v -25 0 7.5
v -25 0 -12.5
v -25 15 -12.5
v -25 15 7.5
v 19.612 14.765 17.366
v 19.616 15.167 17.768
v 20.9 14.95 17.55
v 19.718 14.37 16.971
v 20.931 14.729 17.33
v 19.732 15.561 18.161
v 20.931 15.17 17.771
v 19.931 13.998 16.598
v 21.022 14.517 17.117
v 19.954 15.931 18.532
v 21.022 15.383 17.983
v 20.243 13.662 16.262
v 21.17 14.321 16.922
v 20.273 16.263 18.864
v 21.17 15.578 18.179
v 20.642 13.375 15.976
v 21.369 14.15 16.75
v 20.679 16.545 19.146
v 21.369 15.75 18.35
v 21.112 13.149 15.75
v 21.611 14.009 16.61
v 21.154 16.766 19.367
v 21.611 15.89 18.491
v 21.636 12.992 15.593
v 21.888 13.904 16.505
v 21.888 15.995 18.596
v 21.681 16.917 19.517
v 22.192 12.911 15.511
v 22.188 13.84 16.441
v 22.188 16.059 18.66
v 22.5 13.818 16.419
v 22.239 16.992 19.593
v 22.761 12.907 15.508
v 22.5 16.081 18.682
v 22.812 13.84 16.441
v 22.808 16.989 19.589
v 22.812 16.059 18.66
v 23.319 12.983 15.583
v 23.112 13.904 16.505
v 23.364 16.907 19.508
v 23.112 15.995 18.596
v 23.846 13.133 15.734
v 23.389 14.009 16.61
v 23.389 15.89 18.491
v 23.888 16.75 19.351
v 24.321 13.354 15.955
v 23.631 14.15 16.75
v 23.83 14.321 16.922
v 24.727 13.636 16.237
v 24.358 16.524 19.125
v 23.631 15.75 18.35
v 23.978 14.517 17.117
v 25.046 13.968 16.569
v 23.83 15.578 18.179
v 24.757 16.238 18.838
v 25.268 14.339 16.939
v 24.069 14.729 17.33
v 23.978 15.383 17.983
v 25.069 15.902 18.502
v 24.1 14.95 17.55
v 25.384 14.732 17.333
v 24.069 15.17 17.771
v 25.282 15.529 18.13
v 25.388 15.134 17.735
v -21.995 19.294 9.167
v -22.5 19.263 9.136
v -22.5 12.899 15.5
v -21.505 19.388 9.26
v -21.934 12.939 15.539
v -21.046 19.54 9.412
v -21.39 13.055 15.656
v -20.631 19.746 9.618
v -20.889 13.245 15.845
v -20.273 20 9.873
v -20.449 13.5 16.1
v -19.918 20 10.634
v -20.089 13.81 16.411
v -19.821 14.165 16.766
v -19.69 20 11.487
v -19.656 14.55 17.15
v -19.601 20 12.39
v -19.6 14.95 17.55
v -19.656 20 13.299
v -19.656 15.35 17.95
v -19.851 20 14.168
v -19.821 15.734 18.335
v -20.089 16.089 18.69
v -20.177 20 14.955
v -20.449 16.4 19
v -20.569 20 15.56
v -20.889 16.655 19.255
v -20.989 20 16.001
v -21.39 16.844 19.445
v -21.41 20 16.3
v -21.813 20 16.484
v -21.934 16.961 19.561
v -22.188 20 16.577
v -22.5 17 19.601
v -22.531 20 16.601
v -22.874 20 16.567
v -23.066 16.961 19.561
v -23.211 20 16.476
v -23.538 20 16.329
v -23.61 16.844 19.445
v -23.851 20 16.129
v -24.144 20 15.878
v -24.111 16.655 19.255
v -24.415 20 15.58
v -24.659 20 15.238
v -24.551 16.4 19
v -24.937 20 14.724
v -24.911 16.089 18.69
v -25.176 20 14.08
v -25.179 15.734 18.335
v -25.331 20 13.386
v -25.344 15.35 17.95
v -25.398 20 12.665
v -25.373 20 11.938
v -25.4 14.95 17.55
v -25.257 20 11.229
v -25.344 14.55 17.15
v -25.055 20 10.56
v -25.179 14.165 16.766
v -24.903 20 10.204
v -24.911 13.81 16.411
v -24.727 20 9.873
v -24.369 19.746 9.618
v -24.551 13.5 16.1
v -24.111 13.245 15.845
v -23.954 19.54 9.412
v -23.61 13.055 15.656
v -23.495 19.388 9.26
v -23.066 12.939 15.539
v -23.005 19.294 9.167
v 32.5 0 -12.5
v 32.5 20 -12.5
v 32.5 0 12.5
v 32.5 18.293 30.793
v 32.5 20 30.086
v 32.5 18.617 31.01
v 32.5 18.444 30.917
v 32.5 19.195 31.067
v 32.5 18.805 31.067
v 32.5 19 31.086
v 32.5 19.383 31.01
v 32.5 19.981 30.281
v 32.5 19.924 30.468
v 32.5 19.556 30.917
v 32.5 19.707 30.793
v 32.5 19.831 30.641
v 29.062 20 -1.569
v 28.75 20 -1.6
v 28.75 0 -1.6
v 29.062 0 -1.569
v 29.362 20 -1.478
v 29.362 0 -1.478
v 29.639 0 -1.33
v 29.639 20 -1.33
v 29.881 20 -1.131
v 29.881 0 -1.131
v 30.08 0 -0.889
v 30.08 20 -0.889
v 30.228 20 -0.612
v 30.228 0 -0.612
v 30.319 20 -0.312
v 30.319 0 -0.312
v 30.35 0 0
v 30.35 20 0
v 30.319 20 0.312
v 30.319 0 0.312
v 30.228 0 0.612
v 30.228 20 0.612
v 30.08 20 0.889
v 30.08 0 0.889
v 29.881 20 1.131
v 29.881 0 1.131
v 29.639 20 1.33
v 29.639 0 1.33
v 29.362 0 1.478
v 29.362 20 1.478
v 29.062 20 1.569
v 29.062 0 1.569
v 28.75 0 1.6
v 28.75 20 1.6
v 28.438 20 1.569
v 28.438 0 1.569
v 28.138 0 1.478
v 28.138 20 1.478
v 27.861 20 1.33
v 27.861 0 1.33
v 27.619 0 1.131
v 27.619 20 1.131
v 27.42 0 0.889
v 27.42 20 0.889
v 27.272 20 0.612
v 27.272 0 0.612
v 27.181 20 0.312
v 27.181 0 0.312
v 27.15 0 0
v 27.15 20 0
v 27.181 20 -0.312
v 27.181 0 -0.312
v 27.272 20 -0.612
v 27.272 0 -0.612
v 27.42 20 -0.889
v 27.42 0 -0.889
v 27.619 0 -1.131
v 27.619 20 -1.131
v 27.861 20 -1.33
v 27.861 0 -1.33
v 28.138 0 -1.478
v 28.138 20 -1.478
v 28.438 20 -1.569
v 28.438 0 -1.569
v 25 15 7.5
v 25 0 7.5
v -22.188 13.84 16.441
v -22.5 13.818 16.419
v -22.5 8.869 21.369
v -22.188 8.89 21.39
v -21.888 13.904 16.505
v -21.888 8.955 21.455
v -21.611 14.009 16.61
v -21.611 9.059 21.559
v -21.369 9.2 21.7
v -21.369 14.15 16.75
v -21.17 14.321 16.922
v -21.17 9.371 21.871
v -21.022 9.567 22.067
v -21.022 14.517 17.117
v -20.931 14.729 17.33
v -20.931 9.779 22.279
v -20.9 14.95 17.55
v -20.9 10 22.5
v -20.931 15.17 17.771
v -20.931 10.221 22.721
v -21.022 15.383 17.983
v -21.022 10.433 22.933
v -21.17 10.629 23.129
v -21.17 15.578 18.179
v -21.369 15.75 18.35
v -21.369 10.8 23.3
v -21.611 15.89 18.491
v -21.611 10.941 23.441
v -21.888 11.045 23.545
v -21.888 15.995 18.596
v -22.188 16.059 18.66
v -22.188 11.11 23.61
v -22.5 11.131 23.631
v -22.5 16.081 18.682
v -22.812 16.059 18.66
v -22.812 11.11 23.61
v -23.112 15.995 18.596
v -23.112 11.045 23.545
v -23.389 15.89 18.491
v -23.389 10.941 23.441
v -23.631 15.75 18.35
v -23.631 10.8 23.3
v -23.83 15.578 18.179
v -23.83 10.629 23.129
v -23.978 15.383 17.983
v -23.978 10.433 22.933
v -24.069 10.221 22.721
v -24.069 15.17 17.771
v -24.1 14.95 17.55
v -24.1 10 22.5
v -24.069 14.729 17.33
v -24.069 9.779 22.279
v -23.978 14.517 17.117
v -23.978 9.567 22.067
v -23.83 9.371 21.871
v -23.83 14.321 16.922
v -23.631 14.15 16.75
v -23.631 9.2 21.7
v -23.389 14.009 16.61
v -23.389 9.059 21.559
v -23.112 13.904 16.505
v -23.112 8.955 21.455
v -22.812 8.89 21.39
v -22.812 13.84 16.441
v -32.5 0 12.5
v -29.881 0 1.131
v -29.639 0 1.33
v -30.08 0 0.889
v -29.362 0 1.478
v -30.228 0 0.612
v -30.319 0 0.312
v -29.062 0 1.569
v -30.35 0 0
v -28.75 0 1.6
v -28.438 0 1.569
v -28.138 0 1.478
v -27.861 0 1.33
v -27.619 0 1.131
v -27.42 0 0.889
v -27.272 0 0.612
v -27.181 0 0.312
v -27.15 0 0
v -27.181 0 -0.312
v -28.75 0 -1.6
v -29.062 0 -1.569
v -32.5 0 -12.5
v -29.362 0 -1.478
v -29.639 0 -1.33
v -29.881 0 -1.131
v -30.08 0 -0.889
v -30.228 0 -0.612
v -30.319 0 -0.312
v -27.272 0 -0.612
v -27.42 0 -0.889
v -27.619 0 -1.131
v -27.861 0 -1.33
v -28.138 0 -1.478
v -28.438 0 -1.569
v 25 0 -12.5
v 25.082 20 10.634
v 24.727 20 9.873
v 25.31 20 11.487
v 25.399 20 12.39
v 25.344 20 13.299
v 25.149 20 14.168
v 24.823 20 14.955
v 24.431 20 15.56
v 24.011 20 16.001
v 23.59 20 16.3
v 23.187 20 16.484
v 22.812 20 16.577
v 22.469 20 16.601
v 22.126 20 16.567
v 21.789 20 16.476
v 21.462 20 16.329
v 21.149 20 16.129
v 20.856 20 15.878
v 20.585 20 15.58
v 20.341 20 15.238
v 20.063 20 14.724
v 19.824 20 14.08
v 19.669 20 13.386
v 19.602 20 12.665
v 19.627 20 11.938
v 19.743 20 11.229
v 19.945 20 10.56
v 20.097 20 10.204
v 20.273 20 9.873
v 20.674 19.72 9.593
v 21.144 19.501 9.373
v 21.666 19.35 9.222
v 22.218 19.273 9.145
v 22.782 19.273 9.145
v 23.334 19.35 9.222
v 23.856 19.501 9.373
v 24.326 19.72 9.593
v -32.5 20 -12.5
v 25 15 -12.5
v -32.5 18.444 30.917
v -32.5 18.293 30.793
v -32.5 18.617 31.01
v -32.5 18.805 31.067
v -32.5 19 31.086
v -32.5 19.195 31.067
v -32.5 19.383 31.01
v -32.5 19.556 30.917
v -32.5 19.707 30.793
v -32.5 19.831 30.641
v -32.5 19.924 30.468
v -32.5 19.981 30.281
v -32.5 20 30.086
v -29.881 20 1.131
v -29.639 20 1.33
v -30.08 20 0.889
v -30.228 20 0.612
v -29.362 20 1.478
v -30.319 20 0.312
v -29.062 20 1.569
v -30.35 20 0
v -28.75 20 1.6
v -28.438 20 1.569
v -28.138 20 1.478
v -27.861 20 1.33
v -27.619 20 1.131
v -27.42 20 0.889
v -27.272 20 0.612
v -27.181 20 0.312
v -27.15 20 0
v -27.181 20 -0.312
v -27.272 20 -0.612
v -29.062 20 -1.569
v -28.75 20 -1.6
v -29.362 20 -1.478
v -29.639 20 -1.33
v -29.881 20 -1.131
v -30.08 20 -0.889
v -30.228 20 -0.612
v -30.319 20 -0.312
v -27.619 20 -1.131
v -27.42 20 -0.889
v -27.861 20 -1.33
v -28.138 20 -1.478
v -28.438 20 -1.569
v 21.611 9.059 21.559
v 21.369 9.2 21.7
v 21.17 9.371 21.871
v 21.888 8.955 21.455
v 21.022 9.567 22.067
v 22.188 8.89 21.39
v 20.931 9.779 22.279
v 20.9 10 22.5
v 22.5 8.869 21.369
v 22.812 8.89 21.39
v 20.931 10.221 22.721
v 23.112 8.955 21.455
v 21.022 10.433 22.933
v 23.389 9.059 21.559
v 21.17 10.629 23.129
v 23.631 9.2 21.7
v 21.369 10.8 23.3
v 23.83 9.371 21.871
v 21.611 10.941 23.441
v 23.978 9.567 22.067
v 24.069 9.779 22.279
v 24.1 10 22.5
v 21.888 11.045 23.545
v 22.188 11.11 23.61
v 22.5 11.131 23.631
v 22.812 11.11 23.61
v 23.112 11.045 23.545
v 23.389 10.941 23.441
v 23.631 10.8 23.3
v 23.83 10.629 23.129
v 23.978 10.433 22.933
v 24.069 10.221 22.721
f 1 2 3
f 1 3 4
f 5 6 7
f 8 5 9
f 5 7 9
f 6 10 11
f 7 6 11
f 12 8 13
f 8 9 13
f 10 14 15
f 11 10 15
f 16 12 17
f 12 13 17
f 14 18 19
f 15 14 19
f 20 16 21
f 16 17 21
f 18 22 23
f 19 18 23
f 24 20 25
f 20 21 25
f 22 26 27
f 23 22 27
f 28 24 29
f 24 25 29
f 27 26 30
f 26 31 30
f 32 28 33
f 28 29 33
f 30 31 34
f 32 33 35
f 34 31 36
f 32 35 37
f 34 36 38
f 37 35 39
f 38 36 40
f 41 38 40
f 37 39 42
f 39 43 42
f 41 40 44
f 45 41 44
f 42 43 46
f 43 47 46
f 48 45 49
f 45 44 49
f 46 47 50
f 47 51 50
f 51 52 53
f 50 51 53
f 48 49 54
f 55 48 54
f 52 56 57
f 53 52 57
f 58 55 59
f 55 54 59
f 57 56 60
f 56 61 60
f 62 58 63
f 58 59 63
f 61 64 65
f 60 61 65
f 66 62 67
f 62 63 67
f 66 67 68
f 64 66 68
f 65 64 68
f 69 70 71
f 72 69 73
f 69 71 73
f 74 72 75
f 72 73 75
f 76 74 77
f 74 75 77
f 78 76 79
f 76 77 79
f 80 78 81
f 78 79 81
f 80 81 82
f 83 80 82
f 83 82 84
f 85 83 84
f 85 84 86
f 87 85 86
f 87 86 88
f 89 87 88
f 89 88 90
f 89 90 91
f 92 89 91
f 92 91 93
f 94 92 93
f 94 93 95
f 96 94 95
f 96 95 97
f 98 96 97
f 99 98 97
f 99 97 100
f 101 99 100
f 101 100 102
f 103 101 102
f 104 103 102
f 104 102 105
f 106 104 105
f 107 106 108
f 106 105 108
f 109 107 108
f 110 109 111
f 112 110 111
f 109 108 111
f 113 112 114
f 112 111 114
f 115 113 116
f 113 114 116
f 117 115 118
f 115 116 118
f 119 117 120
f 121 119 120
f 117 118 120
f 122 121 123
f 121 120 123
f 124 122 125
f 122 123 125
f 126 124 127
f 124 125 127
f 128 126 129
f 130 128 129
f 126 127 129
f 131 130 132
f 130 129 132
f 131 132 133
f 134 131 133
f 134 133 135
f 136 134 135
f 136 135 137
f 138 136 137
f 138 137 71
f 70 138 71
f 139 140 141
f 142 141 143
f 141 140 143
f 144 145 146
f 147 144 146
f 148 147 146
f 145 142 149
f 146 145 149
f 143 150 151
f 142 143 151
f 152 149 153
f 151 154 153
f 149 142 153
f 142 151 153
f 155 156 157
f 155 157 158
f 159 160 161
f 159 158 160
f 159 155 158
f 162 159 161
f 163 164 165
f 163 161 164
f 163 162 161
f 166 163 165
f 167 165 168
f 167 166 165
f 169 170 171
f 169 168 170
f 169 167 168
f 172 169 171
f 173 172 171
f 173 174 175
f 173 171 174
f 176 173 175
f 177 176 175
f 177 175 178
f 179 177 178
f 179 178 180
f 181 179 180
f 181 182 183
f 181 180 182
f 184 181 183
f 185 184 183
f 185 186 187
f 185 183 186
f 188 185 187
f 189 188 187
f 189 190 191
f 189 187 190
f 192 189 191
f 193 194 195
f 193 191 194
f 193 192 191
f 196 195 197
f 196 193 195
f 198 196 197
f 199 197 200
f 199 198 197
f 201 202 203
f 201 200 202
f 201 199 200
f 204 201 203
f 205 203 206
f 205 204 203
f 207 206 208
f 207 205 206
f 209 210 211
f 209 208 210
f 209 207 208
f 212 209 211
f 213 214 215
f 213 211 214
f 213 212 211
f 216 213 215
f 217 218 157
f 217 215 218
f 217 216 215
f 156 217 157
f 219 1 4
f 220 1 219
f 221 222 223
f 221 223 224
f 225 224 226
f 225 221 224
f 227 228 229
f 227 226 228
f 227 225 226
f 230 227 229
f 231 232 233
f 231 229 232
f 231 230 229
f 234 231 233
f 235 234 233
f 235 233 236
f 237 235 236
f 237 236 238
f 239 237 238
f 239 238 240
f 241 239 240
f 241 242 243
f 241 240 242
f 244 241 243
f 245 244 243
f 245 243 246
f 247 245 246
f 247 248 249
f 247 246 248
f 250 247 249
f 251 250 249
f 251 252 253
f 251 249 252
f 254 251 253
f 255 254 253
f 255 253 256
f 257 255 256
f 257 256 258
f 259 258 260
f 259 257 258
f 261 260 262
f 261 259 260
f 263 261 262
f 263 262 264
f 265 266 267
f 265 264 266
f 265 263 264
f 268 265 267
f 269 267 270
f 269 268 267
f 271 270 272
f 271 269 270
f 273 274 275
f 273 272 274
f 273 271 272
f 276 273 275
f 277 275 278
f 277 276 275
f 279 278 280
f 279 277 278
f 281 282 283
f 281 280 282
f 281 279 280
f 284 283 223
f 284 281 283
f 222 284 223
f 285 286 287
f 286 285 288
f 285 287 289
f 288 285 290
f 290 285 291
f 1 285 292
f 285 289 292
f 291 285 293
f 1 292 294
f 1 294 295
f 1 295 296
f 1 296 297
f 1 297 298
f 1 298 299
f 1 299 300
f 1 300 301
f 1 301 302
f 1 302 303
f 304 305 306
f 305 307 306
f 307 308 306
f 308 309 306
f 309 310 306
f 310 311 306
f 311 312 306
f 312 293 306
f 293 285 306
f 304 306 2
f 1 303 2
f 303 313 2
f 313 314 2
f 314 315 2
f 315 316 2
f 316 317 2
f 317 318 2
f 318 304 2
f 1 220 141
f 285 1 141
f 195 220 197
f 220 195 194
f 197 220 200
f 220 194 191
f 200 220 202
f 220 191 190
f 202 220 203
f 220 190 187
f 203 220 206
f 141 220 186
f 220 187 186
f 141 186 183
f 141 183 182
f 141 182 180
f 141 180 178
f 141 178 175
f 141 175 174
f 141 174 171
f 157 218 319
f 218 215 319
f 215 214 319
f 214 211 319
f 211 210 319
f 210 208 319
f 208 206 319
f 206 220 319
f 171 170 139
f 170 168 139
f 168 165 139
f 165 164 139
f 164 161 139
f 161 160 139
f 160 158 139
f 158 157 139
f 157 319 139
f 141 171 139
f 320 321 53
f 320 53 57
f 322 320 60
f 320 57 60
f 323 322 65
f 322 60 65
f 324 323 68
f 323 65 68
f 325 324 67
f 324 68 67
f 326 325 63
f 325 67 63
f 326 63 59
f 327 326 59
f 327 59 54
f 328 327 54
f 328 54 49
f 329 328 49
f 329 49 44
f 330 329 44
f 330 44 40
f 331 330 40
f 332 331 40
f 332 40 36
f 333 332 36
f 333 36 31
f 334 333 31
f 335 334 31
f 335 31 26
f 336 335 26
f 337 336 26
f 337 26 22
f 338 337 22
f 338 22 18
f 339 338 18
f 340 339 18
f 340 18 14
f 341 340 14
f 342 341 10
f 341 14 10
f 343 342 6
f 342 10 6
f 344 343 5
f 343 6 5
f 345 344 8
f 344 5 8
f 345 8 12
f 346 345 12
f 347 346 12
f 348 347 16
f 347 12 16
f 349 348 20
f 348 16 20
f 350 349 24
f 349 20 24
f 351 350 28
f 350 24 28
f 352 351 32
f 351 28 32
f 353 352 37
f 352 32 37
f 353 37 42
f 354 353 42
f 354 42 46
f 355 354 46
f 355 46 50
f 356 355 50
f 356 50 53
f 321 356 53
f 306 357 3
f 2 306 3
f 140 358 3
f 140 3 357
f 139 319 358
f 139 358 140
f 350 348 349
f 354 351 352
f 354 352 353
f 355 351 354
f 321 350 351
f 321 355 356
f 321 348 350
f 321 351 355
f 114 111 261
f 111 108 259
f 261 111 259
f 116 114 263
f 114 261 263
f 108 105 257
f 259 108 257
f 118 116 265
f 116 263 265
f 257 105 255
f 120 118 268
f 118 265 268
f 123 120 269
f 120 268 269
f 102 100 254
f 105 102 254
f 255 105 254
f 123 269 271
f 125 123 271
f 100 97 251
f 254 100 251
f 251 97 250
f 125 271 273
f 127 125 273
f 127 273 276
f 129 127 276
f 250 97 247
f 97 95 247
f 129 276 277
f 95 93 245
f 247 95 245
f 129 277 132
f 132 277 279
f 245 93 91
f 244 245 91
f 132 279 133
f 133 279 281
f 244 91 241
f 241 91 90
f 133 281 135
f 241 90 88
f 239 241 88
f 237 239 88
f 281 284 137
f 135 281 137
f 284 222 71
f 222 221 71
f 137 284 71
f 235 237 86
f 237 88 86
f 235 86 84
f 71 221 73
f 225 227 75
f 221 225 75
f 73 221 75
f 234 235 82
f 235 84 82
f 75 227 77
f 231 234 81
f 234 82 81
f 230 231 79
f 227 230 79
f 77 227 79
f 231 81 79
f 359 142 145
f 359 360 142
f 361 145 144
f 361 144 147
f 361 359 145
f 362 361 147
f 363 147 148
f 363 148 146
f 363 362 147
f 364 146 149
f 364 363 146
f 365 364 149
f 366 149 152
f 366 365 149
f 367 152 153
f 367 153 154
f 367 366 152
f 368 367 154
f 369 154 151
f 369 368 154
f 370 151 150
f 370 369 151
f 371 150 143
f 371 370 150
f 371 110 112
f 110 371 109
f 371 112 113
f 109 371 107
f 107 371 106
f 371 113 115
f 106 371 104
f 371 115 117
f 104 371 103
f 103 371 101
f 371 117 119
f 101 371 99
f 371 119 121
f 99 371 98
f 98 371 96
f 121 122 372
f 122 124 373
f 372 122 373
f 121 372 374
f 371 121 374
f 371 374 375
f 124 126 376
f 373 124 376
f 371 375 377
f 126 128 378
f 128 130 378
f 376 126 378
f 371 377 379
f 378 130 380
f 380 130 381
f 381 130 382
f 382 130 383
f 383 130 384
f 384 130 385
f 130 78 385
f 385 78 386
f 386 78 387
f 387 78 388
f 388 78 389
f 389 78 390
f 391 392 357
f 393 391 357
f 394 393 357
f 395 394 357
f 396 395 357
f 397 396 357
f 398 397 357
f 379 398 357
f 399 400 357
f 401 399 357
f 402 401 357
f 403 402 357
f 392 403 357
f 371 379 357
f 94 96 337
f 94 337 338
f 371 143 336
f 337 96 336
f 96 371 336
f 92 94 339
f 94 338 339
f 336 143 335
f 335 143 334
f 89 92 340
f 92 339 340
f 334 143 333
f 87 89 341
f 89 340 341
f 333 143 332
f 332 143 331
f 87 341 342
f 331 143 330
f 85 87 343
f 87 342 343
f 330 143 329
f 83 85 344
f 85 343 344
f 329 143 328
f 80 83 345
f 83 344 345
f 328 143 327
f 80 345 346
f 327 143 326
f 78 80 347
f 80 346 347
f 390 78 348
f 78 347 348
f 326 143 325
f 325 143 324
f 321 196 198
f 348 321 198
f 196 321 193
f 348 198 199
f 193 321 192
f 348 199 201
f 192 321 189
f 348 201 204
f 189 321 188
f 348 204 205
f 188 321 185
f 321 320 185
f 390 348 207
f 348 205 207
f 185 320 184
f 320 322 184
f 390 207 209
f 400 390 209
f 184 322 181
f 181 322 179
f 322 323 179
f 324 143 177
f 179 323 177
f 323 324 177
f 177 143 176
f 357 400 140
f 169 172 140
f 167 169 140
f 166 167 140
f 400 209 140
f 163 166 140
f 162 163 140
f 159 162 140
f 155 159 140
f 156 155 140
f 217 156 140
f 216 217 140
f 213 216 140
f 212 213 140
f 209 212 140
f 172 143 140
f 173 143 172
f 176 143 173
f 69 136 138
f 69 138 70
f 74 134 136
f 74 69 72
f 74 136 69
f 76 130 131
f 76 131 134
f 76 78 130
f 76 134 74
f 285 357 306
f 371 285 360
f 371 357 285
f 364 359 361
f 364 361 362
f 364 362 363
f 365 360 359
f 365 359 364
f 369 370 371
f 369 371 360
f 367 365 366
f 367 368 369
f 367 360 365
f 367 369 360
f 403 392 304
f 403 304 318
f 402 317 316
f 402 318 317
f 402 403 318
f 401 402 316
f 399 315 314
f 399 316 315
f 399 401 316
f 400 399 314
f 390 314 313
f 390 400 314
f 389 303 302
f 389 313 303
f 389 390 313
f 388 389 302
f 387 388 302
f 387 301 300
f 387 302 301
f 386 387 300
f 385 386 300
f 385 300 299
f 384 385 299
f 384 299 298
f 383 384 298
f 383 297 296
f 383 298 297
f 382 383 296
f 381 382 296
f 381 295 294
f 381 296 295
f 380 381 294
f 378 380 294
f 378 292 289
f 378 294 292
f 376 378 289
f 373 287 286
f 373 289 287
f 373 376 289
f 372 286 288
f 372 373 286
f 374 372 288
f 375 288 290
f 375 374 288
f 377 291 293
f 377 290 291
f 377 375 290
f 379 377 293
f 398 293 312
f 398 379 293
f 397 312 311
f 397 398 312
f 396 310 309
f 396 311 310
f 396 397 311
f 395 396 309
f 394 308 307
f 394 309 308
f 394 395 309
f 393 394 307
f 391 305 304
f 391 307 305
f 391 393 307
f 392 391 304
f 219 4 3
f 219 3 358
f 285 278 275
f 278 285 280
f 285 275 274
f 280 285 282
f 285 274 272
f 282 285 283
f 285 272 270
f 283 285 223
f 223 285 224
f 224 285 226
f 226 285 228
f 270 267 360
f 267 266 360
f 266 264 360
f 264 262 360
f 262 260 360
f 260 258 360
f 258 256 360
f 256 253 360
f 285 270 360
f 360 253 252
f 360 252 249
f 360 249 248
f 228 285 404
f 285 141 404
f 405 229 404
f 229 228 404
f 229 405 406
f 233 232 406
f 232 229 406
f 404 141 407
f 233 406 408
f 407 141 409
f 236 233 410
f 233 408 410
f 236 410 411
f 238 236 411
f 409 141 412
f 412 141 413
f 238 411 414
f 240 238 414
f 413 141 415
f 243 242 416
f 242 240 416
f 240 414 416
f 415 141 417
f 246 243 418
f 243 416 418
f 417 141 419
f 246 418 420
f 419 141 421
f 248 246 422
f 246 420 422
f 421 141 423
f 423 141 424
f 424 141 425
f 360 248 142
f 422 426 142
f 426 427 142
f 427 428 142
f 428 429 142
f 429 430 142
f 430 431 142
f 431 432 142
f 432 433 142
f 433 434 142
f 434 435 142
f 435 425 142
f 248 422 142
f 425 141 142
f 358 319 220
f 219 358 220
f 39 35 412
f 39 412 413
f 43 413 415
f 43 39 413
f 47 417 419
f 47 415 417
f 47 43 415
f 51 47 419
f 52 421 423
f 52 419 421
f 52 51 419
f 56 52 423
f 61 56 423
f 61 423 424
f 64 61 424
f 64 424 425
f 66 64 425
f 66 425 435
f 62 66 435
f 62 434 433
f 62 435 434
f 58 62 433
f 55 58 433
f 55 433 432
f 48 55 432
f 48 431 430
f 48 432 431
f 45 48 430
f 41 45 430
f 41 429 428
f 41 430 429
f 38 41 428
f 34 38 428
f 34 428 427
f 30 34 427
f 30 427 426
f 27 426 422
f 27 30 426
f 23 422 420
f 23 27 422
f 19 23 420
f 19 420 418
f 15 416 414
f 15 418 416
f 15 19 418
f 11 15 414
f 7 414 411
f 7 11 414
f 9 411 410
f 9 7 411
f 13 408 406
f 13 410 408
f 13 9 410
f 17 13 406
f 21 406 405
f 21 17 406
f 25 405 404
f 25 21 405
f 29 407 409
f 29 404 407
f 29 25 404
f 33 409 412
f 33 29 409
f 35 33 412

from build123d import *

# Parameters (mm, degrees)
SKETCH_1_W               = 65
SKETCH_1_H               = 25
EXTRUDE_1_DEPTH          = 20
EXTRUDE_2_DEPTH          = 65
SKETCH_3_W               = 50
SKETCH_3_H               = 20
CUT_EXTRUDE_1_DEPTH      = 15
CUT_EXTRUDE_2_DEPTH      = 50.33938589
CUT_EXTRUDE_2_DEPTH_BACK = 50.33938589
SKETCH_4_R               = 1.6
CUT_EXTRUDE_START        = -7
SKETCH_5_R               = 2.9
CUT_EXTRUDE_3_DEPTH      = 9
CUT_EXTRUDE_4_DEPTH      = 51.124844139
CUT_EXTRUDE_4_DEPTH_BACK = 51.124844139
SKETCH_6_R               = 1.6
FILLET_1_R               = 1


with BuildPart() as part:
    # 草图1 → 凸台-拉伸1 (new body)
    with BuildSketch(Plane(origin=(0, 0, 0), x_dir=(1, 0, 0), z_dir=(0, 1, 0))):
        Rectangle(SKETCH_1_W, SKETCH_1_H)
    extrude(amount=EXTRUDE_1_DEPTH)

    # 草图2 → 凸台-拉伸2 (add)
    with BuildSketch(Plane(origin=(32.5, 0, 0), x_dir=(0, 0, -1), z_dir=(1, 0, 0))):
        Polygon((-12.5, 0), (-32.5, 20), (-12.5, 20), align=None)
    extrude(amount=-EXTRUDE_2_DEPTH)

    # 草图3 → 切除-拉伸1 (cut)
    with BuildSketch(Plane.XZ):
        with Locations((0, -2.5)):
            Rectangle(SKETCH_3_W, SKETCH_3_H)
    extrude(amount=-CUT_EXTRUDE_1_DEPTH, mode=Mode.SUBTRACT)

    # 草图4 → 切除-拉伸2 (cut, two sides: drawn at the far end of the back side and taken through both)
    with BuildSketch(Plane(origin=(0, -6.25, 6.25), x_dir=(1, 0, 0), z_dir=(0, -0.7071067811865489, 0.7071067811865462)).offset(-CUT_EXTRUDE_2_DEPTH_BACK)):
        with Locations(Location((-22.5, 22.980970389, 0), (0, 0, 270))):
            Circle(SKETCH_4_R)
        with Locations(Location((22.5, 22.980970389, 0), (0, 0, 270))):
            Circle(SKETCH_4_R)
    extrude(amount=CUT_EXTRUDE_2_DEPTH + CUT_EXTRUDE_2_DEPTH_BACK, mode=Mode.SUBTRACT)

    # 草图5 → 切除-拉伸3 (cut)
    with BuildSketch(Plane(origin=(0, -6.25, 6.25), x_dir=(1, 0, 0), z_dir=(0, -0.7071067811865489, 0.7071067811865462)).offset(CUT_EXTRUDE_START)):
        with Locations(Location((-22.5, 22.980970389, 0), (0, 0, 270))):
            Circle(SKETCH_5_R)
        with Locations(Location((22.5, 22.980970389, 0), (0, 0, 320.160225214))):
            Circle(SKETCH_5_R)
    extrude(amount=-CUT_EXTRUDE_3_DEPTH, mode=Mode.SUBTRACT)

    # 草图6 → 切除-拉伸4 (cut, two sides: drawn at the far end of the back side and taken through both)
    with BuildSketch(Plane.XZ.offset(-CUT_EXTRUDE_4_DEPTH_BACK)):
        with Locations(Location((-28.75, 0, 0), (0, 0, 270))):
            Circle(SKETCH_6_R)
        with Locations(Location((28.75, 0, 0), (0, 0, 270))):
            Circle(SKETCH_6_R)
    extrude(amount=CUT_EXTRUDE_4_DEPTH + CUT_EXTRUDE_4_DEPTH_BACK, mode=Mode.SUBTRACT)

    # 圆角1
    fillet_1_edges = [part.edges().sort_by_distance(p)[0] for p in [
        (0, 20, 32.5),
    ]]
    fillet(fillet_1_edges, radius=FILLET_1_R)


solid = part.part
